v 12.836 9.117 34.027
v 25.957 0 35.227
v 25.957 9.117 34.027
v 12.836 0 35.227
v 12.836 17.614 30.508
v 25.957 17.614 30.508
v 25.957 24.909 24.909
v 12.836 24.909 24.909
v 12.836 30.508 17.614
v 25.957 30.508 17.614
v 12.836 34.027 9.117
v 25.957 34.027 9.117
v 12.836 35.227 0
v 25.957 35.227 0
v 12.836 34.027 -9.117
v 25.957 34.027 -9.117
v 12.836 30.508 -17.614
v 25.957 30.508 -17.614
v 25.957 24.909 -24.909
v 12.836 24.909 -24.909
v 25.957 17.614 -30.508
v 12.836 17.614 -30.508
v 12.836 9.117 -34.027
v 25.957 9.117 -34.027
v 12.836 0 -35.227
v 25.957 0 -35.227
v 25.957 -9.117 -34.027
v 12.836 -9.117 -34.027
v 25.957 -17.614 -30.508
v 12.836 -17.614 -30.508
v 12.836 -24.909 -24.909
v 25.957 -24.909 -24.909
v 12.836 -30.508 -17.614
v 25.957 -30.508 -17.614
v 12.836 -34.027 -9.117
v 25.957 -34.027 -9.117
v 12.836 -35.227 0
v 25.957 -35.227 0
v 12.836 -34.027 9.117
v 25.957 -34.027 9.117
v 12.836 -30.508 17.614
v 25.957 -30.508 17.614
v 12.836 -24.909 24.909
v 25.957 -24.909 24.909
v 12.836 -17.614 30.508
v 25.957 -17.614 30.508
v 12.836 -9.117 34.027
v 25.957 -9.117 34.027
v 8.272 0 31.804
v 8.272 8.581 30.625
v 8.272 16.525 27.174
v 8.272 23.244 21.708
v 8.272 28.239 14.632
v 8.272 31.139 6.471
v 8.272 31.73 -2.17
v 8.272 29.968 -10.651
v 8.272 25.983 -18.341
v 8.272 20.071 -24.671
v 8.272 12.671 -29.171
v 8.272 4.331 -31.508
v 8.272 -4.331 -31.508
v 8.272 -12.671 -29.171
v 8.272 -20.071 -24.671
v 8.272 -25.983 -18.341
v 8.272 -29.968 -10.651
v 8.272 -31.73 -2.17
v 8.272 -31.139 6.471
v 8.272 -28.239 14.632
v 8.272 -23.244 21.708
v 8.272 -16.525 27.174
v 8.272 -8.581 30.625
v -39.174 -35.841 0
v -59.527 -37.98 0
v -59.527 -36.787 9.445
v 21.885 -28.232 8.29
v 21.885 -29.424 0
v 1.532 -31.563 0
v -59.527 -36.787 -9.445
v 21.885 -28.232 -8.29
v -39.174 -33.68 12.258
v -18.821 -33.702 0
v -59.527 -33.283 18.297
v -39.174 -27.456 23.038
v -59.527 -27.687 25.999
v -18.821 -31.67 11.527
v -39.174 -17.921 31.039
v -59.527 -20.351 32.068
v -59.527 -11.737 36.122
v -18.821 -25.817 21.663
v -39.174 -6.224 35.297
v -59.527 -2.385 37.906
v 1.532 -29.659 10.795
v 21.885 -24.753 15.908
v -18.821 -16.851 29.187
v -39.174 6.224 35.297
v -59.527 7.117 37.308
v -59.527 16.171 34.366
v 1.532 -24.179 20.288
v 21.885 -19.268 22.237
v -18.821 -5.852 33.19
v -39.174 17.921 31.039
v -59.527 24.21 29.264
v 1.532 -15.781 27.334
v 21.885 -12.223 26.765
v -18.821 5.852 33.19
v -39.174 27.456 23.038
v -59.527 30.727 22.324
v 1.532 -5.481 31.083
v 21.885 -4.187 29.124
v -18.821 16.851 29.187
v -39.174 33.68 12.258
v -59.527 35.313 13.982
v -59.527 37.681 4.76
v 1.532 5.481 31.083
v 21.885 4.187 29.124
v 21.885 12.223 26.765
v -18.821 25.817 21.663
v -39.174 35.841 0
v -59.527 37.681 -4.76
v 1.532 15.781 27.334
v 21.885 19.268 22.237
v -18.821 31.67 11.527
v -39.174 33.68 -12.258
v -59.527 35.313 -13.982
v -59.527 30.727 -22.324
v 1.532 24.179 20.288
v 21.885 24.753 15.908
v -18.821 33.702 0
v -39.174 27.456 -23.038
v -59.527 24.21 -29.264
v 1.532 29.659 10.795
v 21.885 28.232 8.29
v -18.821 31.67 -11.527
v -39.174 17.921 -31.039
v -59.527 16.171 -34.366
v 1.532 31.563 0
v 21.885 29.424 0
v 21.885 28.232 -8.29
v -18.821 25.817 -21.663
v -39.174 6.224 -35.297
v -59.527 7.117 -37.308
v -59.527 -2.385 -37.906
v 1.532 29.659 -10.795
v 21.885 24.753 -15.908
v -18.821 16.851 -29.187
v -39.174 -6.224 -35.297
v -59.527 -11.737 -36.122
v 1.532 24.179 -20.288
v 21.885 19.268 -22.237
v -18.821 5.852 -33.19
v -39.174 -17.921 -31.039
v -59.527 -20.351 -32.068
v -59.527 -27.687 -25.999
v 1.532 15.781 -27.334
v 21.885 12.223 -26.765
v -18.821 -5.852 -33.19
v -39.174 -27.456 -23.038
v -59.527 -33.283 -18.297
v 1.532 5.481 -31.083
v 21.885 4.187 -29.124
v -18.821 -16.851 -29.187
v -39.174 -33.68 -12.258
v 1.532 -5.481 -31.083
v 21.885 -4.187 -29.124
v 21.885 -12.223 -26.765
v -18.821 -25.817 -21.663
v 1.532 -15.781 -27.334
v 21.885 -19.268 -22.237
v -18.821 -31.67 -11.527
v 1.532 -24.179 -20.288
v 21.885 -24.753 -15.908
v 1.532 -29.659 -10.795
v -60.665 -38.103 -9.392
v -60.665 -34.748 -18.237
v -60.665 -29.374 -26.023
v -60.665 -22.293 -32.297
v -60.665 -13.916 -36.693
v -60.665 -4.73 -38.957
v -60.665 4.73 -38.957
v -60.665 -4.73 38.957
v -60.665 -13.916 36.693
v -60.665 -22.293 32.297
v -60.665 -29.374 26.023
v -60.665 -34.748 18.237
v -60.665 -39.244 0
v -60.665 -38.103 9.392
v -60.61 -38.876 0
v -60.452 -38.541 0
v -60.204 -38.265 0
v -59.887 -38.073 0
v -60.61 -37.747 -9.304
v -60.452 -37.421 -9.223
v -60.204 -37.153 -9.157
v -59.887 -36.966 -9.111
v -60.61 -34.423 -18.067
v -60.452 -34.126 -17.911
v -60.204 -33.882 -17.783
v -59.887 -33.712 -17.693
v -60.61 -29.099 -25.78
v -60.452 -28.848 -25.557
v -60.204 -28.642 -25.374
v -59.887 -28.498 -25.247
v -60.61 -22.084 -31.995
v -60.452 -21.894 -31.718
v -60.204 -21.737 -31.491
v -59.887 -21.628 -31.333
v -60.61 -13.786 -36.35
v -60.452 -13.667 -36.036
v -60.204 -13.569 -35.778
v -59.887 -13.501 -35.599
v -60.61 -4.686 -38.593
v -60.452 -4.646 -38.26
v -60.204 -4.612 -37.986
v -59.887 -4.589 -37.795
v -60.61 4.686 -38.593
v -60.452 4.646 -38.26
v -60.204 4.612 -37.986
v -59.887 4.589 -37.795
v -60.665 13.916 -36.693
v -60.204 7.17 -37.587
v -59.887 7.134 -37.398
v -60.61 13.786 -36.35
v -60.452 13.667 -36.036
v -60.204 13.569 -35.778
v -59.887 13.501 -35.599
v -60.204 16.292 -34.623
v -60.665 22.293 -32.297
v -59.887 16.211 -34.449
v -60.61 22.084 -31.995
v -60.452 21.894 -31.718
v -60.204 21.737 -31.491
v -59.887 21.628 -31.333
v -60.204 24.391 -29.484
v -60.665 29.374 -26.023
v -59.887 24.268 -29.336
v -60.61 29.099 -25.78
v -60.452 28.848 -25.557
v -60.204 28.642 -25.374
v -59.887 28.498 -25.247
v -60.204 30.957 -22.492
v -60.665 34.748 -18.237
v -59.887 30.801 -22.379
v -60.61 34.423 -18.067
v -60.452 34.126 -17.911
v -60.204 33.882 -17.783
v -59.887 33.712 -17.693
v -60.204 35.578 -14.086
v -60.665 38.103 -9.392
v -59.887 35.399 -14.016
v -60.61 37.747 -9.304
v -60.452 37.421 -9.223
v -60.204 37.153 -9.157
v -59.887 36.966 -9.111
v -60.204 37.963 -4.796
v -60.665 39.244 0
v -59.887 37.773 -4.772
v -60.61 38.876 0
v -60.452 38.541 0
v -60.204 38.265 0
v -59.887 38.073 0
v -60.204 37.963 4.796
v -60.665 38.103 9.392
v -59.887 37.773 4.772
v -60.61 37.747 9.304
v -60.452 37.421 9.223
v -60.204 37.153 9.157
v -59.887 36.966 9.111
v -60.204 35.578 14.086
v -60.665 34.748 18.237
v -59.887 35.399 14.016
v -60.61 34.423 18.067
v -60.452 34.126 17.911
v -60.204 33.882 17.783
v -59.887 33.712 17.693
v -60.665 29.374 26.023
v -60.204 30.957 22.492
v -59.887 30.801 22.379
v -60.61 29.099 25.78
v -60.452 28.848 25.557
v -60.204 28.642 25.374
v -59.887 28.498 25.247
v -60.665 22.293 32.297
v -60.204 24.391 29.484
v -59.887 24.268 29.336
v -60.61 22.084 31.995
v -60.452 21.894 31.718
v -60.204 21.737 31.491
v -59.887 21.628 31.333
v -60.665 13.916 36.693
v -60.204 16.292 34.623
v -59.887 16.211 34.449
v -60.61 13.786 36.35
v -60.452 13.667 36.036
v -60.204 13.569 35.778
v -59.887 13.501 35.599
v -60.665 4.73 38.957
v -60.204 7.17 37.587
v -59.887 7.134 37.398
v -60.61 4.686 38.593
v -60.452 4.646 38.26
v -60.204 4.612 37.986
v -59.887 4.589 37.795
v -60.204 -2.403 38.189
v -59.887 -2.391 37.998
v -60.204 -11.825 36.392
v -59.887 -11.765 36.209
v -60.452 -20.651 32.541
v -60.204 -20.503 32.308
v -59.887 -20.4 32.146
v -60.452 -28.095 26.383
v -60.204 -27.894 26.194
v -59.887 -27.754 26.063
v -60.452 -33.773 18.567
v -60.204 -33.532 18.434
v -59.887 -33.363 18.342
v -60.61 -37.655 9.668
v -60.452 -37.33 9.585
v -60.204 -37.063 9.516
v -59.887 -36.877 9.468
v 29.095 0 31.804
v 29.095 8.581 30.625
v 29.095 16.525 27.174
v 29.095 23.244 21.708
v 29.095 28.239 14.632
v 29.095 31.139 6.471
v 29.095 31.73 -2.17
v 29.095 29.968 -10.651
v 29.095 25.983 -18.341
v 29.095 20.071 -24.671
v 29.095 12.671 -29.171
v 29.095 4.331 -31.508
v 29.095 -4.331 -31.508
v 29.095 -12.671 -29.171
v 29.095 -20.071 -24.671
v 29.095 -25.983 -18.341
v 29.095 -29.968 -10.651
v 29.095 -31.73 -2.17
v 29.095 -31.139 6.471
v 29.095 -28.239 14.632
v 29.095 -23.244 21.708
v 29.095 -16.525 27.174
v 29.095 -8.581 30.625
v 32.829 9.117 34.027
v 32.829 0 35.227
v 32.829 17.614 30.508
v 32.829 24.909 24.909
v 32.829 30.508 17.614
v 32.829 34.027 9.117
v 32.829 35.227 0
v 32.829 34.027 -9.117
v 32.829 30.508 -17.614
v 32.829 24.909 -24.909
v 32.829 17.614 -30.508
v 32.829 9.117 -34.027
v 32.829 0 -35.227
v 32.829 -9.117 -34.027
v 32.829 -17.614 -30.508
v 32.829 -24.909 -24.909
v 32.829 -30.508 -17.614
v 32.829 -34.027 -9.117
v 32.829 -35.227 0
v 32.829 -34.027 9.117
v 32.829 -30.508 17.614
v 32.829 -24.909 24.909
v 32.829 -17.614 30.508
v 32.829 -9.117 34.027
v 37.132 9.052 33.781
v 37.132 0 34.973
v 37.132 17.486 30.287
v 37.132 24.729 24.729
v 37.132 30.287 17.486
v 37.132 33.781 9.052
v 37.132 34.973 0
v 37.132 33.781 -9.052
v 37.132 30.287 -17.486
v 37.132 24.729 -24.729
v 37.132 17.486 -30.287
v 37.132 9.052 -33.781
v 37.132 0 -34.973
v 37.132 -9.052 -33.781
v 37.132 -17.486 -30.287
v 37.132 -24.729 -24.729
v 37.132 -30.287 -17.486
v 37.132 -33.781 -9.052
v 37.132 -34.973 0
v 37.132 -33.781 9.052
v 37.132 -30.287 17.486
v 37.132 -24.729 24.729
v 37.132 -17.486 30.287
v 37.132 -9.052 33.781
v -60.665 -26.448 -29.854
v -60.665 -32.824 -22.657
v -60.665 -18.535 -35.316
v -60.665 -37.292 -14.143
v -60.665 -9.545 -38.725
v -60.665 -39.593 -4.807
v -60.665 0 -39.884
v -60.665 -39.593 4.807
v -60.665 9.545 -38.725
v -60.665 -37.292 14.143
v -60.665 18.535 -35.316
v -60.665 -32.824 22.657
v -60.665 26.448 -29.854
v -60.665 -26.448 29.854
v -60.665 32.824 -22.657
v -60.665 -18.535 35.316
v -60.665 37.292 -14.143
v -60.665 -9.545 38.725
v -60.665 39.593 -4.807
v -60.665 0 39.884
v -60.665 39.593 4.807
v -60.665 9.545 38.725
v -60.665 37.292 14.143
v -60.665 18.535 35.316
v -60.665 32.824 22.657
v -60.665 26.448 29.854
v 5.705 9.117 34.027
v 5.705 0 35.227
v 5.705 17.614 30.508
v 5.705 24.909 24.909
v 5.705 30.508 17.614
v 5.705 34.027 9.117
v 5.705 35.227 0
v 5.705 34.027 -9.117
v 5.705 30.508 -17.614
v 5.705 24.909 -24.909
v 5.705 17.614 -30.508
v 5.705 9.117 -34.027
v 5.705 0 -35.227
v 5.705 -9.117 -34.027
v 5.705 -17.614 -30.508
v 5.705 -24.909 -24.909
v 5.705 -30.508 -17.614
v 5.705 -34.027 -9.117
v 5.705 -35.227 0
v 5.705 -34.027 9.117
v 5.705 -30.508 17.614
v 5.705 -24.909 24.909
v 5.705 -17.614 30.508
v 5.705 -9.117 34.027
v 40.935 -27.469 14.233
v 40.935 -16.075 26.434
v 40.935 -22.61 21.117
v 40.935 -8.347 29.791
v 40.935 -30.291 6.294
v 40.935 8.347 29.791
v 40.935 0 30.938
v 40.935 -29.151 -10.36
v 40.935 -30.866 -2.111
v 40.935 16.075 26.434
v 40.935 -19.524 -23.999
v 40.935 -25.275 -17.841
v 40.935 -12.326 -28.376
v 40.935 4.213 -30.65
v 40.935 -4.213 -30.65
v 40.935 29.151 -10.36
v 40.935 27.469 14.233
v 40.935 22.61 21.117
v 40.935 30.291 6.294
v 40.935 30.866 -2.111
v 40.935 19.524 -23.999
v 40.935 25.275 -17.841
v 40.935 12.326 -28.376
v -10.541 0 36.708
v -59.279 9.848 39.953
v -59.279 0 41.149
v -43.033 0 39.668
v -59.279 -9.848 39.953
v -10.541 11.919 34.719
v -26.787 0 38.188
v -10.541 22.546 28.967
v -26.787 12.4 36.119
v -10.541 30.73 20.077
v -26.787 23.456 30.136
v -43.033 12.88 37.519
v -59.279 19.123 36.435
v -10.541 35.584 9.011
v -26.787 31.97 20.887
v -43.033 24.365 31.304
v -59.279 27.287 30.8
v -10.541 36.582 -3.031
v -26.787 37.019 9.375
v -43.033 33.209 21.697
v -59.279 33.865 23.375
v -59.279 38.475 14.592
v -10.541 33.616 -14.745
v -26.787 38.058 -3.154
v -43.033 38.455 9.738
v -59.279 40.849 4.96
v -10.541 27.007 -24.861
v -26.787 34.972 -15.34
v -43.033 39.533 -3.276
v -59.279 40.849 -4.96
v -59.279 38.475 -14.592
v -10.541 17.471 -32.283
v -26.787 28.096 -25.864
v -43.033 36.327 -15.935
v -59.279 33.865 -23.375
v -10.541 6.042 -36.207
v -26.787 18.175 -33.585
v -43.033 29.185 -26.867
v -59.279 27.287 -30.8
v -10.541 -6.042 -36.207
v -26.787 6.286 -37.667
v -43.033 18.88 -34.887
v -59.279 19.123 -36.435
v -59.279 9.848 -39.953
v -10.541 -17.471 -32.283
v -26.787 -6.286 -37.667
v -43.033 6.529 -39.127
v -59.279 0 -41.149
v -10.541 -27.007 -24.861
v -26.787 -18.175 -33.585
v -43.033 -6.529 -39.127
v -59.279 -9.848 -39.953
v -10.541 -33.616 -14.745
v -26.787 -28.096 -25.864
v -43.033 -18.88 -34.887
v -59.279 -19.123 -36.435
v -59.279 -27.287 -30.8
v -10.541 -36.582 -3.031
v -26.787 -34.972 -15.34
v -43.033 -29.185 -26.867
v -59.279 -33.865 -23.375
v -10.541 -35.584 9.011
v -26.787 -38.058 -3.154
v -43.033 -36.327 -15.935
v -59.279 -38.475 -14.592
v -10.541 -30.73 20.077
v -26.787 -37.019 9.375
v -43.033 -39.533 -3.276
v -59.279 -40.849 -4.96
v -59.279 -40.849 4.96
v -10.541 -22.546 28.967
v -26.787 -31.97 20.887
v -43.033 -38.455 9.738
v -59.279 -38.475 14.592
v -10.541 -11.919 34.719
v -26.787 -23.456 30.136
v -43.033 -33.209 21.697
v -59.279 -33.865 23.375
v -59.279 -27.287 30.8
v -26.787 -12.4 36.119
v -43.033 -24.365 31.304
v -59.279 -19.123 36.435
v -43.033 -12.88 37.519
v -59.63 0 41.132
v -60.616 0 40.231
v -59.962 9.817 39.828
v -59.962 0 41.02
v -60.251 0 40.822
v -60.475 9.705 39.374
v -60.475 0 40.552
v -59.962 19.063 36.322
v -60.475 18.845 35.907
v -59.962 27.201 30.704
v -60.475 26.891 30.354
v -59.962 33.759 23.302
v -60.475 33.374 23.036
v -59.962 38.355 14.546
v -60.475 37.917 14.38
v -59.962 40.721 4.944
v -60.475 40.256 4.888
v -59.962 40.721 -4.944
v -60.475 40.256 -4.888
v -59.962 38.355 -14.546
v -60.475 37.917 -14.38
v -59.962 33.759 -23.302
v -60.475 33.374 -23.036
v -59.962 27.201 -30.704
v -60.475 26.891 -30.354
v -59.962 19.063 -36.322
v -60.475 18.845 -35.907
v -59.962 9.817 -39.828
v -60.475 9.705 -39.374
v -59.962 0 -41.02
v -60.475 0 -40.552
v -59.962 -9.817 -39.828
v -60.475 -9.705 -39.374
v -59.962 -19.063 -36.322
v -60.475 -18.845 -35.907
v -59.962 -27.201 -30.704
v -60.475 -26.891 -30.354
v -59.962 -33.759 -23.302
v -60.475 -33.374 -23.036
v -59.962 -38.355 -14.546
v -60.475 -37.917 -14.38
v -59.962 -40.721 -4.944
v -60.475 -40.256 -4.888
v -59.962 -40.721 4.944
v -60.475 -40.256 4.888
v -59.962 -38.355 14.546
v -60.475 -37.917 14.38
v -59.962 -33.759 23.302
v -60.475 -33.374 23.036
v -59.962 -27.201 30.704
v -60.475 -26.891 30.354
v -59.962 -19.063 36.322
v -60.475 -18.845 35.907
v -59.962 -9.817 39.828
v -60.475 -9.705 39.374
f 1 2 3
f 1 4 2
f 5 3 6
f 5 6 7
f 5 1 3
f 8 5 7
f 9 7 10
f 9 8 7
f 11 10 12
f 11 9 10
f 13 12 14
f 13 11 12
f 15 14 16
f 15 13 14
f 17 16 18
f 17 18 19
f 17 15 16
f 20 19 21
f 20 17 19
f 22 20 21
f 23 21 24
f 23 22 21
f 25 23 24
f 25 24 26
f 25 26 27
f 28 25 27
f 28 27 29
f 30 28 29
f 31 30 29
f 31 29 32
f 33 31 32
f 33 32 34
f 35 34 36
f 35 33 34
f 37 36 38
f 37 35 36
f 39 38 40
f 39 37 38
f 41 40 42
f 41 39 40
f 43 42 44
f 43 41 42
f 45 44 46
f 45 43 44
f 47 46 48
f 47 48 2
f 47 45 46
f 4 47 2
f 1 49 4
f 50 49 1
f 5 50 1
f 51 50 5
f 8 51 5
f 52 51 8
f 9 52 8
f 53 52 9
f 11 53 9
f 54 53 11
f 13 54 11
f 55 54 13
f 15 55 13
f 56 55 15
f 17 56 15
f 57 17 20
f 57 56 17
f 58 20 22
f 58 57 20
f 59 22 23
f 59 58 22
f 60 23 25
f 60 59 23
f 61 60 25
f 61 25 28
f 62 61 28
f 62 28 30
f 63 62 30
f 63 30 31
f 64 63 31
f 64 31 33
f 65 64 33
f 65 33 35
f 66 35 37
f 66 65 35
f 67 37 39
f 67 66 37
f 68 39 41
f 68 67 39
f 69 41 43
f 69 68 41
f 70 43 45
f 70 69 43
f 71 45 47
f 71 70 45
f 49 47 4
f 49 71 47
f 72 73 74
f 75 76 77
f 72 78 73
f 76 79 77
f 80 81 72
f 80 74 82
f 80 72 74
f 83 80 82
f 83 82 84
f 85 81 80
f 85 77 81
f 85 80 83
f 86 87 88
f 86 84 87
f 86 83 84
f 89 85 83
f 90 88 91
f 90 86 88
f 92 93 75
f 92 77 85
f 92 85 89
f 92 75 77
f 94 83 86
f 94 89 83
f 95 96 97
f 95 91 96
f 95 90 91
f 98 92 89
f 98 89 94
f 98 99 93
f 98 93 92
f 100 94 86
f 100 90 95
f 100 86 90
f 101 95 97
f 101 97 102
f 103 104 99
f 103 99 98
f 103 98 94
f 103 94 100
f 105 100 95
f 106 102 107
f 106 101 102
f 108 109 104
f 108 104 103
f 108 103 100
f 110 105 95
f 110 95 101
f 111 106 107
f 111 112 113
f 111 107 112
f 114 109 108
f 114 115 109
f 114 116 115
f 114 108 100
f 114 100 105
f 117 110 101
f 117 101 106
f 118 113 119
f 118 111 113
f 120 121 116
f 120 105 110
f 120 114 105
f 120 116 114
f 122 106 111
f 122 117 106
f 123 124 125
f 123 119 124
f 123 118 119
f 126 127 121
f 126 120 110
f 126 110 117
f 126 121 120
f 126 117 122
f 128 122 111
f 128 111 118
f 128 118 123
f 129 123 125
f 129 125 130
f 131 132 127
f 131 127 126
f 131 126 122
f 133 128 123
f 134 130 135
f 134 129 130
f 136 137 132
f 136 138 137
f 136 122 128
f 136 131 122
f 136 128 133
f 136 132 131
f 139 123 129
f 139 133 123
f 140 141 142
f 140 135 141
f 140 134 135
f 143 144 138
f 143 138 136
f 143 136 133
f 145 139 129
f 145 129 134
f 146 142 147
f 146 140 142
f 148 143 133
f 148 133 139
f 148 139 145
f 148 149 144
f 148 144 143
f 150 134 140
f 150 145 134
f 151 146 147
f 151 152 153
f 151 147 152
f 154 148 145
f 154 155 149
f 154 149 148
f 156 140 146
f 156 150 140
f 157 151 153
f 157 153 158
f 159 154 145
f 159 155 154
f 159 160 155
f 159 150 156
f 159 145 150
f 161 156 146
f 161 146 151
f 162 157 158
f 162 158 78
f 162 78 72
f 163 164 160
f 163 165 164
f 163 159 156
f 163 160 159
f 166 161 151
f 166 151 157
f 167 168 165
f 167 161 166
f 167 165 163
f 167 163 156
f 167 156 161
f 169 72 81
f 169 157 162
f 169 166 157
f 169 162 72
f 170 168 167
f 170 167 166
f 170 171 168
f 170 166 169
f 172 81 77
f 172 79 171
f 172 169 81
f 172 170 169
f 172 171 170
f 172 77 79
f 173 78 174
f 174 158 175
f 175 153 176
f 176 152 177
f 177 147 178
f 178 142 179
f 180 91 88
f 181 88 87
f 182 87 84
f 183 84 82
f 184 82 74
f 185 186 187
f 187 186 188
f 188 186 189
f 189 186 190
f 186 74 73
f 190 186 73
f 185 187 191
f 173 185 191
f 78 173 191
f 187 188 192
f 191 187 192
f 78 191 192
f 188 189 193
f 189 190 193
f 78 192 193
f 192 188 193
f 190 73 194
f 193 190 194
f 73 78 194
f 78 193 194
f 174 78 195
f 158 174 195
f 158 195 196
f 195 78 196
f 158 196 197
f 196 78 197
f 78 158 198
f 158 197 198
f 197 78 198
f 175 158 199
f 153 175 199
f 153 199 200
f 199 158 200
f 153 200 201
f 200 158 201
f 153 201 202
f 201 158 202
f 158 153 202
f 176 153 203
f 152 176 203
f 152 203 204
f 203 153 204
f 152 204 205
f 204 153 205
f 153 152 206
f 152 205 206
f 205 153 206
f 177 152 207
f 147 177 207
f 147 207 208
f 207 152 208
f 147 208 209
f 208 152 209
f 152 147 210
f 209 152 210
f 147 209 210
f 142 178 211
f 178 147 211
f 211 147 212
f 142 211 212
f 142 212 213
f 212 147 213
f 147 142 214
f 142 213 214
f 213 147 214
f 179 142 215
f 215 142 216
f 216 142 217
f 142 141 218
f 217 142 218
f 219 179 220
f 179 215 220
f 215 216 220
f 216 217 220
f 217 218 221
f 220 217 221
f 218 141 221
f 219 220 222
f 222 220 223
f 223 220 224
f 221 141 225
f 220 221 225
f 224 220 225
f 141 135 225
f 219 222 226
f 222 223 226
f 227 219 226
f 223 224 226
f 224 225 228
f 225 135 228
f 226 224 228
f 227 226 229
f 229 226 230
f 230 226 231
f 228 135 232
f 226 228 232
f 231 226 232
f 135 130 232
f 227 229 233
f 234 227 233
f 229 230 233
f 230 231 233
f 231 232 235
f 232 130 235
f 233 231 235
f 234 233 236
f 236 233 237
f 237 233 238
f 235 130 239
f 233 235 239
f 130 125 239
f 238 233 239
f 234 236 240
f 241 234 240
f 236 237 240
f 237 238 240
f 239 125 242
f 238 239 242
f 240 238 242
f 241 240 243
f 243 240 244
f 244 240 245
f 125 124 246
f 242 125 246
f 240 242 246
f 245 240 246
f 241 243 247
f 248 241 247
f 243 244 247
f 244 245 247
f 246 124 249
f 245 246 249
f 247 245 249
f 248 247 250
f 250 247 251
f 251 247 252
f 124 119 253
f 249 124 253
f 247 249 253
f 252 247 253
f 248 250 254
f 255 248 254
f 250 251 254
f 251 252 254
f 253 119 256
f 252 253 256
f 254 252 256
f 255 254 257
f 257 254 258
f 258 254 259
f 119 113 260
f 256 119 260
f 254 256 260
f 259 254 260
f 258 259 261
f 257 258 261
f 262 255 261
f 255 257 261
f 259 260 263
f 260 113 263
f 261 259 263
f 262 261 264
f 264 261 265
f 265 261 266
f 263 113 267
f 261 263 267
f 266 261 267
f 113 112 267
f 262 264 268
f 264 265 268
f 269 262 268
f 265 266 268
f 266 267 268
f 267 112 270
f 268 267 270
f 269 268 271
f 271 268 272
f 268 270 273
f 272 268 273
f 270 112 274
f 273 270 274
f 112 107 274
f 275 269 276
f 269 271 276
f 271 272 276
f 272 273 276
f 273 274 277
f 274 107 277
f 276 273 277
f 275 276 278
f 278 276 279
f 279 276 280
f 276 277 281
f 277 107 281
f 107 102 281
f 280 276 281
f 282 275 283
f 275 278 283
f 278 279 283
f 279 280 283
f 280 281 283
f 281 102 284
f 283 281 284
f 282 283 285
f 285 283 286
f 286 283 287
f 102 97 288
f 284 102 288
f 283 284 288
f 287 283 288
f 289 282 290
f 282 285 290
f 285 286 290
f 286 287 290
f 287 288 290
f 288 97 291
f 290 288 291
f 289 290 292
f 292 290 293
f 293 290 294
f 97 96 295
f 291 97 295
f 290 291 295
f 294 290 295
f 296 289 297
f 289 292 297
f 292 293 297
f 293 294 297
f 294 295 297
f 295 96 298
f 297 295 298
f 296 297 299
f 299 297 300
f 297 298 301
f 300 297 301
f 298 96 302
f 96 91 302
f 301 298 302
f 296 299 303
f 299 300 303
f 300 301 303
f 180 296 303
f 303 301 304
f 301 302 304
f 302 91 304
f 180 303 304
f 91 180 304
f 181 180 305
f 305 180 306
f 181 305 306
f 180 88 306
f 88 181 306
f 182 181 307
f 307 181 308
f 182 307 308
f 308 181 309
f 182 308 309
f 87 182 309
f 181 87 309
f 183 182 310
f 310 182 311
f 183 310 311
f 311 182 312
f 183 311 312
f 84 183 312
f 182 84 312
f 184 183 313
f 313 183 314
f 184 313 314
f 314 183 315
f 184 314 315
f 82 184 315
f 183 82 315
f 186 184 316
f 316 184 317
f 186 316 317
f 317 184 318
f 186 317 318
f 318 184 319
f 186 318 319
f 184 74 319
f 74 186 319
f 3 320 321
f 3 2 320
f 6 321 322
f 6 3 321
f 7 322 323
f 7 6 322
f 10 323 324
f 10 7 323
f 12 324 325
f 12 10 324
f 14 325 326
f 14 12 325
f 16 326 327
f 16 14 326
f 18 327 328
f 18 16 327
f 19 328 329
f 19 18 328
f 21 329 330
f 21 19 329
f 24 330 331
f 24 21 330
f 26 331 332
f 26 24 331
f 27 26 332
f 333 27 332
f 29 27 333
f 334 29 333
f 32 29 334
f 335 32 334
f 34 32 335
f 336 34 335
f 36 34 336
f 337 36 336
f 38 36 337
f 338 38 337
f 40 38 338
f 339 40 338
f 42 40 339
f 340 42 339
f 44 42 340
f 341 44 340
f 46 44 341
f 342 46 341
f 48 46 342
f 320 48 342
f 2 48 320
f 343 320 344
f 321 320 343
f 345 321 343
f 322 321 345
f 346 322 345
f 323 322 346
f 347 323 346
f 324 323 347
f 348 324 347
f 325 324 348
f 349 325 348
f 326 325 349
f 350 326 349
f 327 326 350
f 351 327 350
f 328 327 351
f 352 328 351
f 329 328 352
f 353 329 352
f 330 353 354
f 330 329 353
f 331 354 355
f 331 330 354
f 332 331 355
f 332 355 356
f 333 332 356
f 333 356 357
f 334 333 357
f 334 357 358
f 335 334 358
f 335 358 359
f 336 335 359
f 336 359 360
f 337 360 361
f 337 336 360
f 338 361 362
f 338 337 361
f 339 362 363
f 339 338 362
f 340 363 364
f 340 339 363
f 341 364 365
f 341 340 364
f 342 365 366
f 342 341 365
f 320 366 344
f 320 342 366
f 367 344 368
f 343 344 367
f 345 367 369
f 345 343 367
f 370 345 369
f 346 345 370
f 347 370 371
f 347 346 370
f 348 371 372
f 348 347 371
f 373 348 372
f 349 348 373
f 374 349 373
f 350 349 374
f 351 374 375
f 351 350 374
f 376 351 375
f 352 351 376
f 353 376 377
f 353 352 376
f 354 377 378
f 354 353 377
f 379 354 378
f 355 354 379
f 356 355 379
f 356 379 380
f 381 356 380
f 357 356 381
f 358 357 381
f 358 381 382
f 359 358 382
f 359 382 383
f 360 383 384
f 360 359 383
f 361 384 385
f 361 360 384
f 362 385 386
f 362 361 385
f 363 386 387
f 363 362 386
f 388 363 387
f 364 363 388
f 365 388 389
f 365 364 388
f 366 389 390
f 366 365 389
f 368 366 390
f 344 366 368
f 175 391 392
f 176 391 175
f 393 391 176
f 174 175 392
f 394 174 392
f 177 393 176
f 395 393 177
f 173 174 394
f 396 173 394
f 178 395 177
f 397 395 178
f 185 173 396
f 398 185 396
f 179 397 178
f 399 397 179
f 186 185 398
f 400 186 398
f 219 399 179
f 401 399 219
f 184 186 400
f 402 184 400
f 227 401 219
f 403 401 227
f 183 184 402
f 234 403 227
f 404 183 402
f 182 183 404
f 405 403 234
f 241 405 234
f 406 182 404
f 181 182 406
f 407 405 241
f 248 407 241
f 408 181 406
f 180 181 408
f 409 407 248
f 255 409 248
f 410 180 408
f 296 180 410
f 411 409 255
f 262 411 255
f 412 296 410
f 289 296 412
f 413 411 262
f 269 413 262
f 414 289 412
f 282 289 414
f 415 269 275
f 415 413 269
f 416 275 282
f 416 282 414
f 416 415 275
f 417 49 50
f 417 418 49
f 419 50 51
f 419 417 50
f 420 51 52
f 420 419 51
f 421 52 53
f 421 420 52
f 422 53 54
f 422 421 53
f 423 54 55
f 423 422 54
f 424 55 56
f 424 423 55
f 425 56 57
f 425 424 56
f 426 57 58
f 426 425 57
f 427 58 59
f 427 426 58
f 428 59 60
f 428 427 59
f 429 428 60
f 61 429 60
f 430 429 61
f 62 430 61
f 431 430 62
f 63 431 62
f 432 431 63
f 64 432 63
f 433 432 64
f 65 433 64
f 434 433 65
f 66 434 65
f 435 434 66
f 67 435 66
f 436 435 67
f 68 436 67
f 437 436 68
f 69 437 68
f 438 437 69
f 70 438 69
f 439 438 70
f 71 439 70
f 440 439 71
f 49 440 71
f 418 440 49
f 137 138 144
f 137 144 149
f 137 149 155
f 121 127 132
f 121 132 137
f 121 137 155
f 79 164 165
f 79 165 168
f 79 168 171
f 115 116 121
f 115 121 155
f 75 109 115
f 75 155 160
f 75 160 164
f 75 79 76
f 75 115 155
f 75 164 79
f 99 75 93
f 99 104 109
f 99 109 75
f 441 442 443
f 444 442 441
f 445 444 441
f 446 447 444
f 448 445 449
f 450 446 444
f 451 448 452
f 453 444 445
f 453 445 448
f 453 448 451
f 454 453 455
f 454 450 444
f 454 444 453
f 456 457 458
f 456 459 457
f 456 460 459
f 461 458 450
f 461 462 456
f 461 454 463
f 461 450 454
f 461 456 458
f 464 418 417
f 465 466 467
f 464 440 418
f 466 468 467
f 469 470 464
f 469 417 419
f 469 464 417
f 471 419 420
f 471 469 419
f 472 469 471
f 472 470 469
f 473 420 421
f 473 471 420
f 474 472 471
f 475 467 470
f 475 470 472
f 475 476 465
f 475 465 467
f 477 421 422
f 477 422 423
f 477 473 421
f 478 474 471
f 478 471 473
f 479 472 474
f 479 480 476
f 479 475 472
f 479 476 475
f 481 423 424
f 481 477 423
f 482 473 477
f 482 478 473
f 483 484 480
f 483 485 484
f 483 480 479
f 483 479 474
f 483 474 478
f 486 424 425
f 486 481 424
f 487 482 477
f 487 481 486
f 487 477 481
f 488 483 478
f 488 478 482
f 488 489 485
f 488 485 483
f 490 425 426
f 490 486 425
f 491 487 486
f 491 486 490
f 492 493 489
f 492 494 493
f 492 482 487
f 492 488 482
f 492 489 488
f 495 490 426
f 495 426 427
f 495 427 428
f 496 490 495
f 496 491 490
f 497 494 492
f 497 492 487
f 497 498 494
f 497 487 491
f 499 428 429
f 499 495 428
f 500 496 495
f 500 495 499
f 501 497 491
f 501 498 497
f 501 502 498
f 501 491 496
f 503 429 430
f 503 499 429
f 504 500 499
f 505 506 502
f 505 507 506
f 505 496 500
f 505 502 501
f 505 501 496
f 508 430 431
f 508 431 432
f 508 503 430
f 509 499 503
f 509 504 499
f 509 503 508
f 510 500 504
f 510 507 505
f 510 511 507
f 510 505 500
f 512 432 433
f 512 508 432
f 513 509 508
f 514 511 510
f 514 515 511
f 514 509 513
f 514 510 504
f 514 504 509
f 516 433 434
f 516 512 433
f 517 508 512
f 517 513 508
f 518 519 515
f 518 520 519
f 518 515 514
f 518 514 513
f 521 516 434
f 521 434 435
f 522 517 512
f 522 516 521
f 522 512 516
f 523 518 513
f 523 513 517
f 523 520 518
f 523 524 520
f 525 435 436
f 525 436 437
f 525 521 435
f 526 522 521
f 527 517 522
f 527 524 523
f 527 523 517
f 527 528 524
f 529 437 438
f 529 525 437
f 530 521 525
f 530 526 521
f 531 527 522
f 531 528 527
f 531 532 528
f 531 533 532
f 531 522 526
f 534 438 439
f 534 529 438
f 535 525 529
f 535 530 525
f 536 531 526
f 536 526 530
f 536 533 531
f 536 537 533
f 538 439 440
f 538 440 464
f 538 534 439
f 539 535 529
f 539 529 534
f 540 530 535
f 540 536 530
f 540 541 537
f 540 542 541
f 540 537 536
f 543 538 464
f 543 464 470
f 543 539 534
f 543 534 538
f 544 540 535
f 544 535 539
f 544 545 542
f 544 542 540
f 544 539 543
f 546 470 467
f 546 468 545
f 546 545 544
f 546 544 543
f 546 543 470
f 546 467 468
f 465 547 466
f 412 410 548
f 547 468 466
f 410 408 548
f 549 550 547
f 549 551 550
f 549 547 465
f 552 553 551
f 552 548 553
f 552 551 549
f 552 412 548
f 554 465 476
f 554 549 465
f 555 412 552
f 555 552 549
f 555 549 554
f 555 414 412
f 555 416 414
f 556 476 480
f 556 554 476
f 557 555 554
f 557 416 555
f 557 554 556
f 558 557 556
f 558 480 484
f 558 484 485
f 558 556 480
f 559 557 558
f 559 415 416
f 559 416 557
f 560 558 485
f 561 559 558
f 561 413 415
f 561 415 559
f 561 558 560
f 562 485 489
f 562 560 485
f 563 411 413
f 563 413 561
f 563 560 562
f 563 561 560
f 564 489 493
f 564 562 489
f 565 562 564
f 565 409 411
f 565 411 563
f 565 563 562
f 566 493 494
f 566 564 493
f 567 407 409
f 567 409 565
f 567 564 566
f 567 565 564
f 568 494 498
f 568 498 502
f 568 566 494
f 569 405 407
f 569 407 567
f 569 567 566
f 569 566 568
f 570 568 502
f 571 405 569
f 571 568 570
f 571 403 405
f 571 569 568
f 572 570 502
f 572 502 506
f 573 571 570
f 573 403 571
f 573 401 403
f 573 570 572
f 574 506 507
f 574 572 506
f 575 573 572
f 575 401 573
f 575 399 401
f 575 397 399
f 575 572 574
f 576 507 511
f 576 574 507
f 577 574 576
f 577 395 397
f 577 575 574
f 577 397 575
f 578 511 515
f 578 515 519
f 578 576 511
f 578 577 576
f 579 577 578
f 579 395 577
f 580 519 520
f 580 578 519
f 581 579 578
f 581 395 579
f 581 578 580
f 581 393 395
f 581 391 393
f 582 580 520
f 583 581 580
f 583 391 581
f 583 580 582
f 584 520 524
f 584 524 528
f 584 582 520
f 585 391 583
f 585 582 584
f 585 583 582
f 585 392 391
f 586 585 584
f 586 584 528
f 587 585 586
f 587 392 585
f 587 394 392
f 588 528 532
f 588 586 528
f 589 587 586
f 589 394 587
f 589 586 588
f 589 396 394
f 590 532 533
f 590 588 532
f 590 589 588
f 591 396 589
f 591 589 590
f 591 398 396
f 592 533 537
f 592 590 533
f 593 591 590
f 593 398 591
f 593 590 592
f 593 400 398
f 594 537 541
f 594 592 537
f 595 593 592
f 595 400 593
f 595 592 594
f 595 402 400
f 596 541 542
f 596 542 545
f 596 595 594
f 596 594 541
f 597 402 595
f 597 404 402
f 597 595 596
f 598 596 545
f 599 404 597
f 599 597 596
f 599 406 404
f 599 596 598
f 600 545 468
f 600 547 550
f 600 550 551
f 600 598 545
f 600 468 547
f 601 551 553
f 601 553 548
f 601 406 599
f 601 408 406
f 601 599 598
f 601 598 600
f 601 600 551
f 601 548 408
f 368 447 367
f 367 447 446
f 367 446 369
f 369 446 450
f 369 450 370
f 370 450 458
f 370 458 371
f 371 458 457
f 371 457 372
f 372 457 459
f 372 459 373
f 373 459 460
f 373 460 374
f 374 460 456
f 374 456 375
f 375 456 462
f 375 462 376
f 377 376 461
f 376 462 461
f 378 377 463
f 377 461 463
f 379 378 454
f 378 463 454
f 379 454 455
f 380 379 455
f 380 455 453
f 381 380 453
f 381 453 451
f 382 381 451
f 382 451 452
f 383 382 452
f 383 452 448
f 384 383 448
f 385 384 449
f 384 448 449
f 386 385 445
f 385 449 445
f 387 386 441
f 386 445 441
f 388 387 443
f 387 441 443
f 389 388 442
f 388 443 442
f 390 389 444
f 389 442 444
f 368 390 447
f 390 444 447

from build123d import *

# Parameters (mm, degrees)
F2_R     = 38.1
F3_DEPTH = 82.55
F3_TAPER = 6
F4_SIZE  = 3.81
F5_R     = 1.27
F6_R     = 1.27


with BuildPart() as f1:
    # F0 (on Front) → F1 (revolve)
    with BuildSketch(Plane.XZ):
        Polygon((-60.6646513261, 41.275), (-60.6646513261, 0), (40.9353486739, 0), (40.9353486739, 34.7477929017), (32.8286082969, 35.2272205055), (29.094543308, 31.804330647), (25.956897065, 35.2272205055), (12.8358363484, 35.2272205055), (8.2719782367, 31.804330647), (5.7048136368, 35.2272205055), align=None)
    revolve(axis=Axis((-9.8646513261, 0, 0), (-1, 0, 0)))

    # F2 (on face) → F3 (cut)
    with BuildSketch(Plane(origin=(-60.6646513261, 0, 0), x_dir=(0, -1, 0), z_dir=(-1, 0, 0))):
        Circle(F2_R)
    extrude(amount=-F3_DEPTH, taper=F3_TAPER, mode=Mode.SUBTRACT)

    # F4
    f4_edges = [f1.edges().sort_by_distance(p)[0] for p in [
        (40.935349, 0, -34.747793),
    ]]
    chamfer(f4_edges, length=F4_SIZE)

    # F5
    f5_edges = [f1.edges().sort_by_distance(p)[0] for p in [
        (-60.664651, 0, -41.275),
    ]]
    fillet(f5_edges, radius=F5_R)

    # F6
    f6_edges = [f1.edges().sort_by_distance(p)[0] for p in [
        (-60.664651, 0, -39.884012),
        (-60.664651, 38.1, 0),
    ]]
    fillet(f6_edges, radius=F6_R)


solid = f1.part
